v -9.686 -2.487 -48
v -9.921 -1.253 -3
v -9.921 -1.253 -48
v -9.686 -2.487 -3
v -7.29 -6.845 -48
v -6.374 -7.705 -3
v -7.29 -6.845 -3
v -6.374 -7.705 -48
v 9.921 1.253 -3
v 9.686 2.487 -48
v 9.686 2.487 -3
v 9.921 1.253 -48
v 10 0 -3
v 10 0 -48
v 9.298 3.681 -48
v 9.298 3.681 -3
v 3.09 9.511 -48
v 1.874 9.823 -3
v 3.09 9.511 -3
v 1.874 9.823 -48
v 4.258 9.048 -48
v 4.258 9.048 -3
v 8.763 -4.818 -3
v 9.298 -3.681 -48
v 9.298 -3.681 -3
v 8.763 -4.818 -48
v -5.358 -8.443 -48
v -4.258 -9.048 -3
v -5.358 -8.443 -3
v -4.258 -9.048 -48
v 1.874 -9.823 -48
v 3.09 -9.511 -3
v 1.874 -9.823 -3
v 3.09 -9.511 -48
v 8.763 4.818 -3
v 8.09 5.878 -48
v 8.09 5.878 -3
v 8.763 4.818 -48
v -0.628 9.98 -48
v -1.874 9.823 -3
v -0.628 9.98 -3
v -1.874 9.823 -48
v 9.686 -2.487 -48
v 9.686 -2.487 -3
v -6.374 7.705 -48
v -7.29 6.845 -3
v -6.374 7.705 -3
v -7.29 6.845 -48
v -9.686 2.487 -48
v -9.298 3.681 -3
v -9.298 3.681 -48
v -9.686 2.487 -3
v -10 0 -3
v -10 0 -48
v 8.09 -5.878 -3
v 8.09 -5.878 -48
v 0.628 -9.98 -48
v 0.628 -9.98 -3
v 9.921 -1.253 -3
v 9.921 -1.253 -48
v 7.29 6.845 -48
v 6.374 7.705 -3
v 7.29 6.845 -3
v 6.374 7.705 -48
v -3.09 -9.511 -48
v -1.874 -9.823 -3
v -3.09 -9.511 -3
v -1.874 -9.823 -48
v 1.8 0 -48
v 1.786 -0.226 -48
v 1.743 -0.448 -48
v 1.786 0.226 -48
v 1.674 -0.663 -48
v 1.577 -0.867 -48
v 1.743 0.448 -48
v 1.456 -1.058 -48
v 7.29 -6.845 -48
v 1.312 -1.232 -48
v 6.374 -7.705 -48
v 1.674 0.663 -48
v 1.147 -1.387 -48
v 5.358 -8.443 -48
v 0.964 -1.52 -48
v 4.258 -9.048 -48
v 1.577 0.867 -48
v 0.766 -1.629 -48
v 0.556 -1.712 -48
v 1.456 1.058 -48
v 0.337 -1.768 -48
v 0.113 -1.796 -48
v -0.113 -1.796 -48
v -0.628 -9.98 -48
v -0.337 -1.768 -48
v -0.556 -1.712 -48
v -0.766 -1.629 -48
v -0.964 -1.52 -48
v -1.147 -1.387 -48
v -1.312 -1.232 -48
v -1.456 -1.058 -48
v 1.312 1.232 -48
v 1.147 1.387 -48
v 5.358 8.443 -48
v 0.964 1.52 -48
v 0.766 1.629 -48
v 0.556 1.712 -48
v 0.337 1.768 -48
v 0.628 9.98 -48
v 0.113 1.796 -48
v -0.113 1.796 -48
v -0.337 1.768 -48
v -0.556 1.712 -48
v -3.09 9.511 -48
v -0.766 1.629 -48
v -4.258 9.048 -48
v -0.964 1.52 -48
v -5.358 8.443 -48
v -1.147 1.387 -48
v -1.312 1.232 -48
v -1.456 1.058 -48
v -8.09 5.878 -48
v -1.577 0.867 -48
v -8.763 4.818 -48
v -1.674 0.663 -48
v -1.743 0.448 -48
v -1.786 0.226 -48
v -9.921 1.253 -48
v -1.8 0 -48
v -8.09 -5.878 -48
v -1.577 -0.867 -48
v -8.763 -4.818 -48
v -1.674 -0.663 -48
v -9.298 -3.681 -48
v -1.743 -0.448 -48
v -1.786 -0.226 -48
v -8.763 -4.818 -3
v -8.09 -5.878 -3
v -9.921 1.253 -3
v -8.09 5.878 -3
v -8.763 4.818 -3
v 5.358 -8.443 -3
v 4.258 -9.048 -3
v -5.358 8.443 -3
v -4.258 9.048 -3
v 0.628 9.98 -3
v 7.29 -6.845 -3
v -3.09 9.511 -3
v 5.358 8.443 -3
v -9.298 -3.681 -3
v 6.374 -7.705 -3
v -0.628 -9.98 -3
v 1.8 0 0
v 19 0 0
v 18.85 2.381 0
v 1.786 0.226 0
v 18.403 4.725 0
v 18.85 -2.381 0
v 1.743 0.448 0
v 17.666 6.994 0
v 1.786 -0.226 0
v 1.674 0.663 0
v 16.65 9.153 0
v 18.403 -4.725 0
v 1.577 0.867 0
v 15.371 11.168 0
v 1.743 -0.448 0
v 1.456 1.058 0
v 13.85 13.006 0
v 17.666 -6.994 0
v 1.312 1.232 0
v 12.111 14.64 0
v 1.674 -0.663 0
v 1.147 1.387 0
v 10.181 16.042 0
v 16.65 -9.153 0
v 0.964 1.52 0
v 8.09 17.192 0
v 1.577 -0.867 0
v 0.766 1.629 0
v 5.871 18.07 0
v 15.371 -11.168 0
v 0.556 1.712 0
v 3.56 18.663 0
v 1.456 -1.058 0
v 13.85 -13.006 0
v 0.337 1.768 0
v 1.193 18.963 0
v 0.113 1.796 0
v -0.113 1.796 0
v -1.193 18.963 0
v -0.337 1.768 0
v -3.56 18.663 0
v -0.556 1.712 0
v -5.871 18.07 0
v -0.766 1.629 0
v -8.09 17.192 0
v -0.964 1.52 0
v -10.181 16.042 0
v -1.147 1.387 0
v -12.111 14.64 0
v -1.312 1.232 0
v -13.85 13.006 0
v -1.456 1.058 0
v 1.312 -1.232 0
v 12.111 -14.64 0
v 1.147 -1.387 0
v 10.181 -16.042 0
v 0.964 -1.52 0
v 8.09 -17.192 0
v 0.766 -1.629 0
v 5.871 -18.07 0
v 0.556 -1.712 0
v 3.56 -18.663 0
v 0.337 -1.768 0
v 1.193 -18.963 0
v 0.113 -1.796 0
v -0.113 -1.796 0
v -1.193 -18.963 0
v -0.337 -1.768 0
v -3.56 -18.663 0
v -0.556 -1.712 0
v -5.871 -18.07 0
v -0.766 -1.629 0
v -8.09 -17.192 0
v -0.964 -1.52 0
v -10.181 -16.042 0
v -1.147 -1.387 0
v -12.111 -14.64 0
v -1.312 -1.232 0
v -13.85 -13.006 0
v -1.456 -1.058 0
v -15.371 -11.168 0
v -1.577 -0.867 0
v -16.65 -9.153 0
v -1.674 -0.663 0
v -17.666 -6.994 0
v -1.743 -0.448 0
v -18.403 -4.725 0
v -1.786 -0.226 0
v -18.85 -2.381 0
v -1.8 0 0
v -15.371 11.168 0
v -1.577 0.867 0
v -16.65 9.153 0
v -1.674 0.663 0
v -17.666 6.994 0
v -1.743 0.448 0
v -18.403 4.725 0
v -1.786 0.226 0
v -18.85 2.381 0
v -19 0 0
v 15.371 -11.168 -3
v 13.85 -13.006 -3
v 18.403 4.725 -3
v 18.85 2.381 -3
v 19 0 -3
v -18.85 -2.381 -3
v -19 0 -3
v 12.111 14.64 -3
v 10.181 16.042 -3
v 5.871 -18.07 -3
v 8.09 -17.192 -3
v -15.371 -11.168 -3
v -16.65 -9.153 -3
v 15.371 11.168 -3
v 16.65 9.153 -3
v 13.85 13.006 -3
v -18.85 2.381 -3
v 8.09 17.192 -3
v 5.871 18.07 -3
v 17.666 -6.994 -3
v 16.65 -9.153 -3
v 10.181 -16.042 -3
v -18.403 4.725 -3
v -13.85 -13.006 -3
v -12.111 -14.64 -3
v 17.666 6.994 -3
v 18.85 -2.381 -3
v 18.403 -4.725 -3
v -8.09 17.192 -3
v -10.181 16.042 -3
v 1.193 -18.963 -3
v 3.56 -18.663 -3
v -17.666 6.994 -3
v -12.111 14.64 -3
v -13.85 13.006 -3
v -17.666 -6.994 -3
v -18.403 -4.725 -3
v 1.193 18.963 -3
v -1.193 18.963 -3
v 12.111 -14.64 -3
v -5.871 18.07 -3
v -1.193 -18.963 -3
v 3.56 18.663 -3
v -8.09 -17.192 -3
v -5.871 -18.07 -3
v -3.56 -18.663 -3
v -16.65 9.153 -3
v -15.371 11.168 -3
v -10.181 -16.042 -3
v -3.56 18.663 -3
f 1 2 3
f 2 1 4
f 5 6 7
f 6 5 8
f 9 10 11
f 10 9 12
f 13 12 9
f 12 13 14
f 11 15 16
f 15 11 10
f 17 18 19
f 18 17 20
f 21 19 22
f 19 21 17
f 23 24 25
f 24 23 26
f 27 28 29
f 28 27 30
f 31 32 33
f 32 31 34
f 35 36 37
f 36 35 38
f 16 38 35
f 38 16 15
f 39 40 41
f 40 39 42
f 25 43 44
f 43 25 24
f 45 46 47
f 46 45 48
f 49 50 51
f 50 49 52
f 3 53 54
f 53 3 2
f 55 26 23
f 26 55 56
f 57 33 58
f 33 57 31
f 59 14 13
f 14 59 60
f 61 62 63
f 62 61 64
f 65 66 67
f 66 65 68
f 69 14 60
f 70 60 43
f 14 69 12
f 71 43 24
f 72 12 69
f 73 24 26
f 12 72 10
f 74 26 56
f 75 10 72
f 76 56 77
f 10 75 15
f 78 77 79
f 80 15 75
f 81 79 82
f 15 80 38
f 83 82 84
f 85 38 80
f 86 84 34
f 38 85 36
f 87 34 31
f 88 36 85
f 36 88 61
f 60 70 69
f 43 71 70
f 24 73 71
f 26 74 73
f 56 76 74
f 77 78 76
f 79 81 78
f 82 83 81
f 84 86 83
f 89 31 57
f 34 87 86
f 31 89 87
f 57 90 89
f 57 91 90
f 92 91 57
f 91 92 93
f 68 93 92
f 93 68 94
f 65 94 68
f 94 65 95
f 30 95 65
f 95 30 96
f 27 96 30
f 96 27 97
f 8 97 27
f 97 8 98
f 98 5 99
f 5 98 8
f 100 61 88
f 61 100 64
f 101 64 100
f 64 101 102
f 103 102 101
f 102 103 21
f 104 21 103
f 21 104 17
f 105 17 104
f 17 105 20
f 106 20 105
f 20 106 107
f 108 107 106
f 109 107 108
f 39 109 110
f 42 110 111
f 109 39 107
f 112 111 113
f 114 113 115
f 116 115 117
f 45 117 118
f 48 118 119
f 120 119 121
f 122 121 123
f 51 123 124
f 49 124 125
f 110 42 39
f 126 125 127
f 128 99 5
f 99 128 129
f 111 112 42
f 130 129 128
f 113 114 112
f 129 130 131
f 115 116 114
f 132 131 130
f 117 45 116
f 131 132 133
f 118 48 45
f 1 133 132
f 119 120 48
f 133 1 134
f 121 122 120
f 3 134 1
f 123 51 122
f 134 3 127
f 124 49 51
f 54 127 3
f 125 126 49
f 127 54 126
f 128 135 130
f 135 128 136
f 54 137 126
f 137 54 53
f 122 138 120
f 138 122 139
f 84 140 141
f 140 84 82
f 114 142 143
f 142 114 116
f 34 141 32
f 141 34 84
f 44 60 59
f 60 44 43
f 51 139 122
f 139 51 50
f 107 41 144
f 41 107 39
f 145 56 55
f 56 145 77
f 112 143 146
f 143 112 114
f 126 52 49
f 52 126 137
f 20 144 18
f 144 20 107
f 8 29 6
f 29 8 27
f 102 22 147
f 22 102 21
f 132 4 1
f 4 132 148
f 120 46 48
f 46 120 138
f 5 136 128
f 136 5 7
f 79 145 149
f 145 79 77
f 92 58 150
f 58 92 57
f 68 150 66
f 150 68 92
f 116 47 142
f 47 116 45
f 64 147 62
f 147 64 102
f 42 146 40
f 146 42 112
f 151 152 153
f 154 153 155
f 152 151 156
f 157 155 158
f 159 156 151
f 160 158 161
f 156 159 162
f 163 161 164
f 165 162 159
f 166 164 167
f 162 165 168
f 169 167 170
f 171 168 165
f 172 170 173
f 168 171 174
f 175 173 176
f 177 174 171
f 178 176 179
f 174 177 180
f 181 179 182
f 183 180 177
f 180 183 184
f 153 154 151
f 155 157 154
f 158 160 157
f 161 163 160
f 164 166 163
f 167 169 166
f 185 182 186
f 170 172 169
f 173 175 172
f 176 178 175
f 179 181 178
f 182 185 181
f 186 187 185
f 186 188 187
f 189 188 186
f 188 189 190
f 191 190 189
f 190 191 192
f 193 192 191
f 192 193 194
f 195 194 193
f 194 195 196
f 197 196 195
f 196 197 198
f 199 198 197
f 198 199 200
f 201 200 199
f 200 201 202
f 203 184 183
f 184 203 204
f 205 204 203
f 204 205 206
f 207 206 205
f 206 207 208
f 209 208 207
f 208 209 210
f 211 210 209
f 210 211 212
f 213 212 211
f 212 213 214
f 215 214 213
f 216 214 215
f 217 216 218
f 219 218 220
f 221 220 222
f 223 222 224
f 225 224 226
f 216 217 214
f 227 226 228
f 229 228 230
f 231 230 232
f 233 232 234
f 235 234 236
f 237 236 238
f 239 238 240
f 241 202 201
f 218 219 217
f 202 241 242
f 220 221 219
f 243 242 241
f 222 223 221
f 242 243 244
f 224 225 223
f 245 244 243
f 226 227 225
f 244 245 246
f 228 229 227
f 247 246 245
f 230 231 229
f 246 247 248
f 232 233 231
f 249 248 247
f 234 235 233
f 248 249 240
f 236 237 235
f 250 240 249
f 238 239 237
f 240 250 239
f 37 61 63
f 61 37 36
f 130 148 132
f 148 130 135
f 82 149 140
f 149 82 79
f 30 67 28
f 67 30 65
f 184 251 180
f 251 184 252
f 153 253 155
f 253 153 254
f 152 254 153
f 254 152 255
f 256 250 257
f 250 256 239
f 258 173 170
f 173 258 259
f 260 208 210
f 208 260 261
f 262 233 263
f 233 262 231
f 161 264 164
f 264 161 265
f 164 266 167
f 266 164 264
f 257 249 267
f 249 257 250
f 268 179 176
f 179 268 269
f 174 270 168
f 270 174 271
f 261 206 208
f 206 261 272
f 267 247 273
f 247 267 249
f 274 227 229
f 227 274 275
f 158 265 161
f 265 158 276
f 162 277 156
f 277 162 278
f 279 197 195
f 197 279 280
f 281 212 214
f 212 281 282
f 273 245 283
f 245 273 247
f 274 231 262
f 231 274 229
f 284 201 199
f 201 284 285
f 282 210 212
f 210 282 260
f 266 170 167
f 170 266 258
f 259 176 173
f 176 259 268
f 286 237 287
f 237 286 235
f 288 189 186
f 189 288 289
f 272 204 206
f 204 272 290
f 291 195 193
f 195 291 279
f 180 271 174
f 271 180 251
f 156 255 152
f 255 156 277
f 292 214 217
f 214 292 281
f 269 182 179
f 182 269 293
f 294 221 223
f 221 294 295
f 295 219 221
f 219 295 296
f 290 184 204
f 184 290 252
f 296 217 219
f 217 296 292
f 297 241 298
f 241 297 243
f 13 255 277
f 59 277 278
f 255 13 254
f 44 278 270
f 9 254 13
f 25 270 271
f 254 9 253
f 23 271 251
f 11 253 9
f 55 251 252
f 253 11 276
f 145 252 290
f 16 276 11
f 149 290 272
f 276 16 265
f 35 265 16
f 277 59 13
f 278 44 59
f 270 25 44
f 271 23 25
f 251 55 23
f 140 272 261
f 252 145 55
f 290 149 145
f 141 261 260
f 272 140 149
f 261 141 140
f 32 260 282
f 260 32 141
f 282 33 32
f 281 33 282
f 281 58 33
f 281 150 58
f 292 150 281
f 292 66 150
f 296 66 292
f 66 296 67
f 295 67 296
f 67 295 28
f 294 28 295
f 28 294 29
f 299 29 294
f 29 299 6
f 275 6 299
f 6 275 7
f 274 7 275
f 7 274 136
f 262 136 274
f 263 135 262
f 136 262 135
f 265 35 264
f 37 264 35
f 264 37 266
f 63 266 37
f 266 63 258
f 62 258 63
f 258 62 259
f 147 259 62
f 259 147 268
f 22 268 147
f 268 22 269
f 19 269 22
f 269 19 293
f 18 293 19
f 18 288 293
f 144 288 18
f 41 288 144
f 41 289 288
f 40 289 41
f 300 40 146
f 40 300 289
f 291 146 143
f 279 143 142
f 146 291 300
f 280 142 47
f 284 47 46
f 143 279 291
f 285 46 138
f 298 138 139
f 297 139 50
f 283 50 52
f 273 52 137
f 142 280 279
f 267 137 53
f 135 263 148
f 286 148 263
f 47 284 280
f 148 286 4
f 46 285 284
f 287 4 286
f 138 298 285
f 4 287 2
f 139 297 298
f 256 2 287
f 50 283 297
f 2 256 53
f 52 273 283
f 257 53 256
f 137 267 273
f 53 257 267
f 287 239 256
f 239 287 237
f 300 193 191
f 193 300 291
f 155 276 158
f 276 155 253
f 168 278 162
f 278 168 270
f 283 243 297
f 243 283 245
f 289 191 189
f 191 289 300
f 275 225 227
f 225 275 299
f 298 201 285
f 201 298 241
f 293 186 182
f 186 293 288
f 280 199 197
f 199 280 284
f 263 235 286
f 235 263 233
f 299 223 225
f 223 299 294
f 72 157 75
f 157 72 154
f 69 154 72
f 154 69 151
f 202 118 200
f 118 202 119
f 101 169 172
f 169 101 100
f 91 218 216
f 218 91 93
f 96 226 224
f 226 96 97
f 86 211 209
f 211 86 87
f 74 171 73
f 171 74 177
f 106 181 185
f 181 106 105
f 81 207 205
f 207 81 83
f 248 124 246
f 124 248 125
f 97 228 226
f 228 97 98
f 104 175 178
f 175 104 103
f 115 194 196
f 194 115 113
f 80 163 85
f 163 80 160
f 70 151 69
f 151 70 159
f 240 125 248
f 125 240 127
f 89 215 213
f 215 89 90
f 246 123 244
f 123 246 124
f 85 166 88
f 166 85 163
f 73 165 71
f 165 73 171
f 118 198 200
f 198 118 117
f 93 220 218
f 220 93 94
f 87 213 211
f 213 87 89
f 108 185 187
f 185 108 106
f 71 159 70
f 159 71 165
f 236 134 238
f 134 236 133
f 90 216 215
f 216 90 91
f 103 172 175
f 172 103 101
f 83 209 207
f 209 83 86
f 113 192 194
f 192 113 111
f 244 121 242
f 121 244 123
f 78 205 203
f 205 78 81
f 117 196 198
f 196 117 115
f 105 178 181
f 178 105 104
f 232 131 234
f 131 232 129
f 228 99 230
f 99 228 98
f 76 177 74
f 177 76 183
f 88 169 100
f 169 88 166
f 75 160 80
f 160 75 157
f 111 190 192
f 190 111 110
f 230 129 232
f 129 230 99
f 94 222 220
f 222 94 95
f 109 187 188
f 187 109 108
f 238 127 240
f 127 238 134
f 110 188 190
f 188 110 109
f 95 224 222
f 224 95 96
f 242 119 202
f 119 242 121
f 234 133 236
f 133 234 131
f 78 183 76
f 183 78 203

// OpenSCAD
$fn = 50;


difference() {
	union() {
		translate(v = [0, 0, -48.0000000000]) {
			cylinder(h = 48, r = 10.0000000000);
		}
		translate(v = [0, 0, -3.0000000000]) {
			cylinder(h = 3, r = 19.0000000000);
		}
	}
	union() {
		#translate(v = [0, 0, -48]) {
			cylinder(h = 48, r = 1.8000000000);
		}
	}
}
